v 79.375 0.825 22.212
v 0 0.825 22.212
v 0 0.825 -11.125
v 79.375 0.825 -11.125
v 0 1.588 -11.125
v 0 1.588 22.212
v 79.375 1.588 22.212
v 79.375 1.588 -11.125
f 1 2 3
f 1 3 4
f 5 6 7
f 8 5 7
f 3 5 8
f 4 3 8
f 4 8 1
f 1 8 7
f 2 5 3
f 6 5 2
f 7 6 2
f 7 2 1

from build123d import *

# Parameters (mm, degrees)
F0_W     = 79.375
F0_H     = 33.3375
F1_DEPTH = 0.762


with BuildPart() as f1:
    # F0 (on Front) → F1 (new body)
    with BuildSketch(Plane.XZ):
        with Locations((39.6875, 16.66875)):
            Rectangle(F0_W, F0_H)
    extrude(amount=F1_DEPTH)


with BuildPart() as f1_1:
    # F2: moved
    add(f1.part.moved(Location((0, 0, -11.1252))))


with BuildPart() as f1_2:
    # F3: moved
    add(f1_1.part.moved(Location((0, 1.5875, 0))))


solid = f1_2.part
